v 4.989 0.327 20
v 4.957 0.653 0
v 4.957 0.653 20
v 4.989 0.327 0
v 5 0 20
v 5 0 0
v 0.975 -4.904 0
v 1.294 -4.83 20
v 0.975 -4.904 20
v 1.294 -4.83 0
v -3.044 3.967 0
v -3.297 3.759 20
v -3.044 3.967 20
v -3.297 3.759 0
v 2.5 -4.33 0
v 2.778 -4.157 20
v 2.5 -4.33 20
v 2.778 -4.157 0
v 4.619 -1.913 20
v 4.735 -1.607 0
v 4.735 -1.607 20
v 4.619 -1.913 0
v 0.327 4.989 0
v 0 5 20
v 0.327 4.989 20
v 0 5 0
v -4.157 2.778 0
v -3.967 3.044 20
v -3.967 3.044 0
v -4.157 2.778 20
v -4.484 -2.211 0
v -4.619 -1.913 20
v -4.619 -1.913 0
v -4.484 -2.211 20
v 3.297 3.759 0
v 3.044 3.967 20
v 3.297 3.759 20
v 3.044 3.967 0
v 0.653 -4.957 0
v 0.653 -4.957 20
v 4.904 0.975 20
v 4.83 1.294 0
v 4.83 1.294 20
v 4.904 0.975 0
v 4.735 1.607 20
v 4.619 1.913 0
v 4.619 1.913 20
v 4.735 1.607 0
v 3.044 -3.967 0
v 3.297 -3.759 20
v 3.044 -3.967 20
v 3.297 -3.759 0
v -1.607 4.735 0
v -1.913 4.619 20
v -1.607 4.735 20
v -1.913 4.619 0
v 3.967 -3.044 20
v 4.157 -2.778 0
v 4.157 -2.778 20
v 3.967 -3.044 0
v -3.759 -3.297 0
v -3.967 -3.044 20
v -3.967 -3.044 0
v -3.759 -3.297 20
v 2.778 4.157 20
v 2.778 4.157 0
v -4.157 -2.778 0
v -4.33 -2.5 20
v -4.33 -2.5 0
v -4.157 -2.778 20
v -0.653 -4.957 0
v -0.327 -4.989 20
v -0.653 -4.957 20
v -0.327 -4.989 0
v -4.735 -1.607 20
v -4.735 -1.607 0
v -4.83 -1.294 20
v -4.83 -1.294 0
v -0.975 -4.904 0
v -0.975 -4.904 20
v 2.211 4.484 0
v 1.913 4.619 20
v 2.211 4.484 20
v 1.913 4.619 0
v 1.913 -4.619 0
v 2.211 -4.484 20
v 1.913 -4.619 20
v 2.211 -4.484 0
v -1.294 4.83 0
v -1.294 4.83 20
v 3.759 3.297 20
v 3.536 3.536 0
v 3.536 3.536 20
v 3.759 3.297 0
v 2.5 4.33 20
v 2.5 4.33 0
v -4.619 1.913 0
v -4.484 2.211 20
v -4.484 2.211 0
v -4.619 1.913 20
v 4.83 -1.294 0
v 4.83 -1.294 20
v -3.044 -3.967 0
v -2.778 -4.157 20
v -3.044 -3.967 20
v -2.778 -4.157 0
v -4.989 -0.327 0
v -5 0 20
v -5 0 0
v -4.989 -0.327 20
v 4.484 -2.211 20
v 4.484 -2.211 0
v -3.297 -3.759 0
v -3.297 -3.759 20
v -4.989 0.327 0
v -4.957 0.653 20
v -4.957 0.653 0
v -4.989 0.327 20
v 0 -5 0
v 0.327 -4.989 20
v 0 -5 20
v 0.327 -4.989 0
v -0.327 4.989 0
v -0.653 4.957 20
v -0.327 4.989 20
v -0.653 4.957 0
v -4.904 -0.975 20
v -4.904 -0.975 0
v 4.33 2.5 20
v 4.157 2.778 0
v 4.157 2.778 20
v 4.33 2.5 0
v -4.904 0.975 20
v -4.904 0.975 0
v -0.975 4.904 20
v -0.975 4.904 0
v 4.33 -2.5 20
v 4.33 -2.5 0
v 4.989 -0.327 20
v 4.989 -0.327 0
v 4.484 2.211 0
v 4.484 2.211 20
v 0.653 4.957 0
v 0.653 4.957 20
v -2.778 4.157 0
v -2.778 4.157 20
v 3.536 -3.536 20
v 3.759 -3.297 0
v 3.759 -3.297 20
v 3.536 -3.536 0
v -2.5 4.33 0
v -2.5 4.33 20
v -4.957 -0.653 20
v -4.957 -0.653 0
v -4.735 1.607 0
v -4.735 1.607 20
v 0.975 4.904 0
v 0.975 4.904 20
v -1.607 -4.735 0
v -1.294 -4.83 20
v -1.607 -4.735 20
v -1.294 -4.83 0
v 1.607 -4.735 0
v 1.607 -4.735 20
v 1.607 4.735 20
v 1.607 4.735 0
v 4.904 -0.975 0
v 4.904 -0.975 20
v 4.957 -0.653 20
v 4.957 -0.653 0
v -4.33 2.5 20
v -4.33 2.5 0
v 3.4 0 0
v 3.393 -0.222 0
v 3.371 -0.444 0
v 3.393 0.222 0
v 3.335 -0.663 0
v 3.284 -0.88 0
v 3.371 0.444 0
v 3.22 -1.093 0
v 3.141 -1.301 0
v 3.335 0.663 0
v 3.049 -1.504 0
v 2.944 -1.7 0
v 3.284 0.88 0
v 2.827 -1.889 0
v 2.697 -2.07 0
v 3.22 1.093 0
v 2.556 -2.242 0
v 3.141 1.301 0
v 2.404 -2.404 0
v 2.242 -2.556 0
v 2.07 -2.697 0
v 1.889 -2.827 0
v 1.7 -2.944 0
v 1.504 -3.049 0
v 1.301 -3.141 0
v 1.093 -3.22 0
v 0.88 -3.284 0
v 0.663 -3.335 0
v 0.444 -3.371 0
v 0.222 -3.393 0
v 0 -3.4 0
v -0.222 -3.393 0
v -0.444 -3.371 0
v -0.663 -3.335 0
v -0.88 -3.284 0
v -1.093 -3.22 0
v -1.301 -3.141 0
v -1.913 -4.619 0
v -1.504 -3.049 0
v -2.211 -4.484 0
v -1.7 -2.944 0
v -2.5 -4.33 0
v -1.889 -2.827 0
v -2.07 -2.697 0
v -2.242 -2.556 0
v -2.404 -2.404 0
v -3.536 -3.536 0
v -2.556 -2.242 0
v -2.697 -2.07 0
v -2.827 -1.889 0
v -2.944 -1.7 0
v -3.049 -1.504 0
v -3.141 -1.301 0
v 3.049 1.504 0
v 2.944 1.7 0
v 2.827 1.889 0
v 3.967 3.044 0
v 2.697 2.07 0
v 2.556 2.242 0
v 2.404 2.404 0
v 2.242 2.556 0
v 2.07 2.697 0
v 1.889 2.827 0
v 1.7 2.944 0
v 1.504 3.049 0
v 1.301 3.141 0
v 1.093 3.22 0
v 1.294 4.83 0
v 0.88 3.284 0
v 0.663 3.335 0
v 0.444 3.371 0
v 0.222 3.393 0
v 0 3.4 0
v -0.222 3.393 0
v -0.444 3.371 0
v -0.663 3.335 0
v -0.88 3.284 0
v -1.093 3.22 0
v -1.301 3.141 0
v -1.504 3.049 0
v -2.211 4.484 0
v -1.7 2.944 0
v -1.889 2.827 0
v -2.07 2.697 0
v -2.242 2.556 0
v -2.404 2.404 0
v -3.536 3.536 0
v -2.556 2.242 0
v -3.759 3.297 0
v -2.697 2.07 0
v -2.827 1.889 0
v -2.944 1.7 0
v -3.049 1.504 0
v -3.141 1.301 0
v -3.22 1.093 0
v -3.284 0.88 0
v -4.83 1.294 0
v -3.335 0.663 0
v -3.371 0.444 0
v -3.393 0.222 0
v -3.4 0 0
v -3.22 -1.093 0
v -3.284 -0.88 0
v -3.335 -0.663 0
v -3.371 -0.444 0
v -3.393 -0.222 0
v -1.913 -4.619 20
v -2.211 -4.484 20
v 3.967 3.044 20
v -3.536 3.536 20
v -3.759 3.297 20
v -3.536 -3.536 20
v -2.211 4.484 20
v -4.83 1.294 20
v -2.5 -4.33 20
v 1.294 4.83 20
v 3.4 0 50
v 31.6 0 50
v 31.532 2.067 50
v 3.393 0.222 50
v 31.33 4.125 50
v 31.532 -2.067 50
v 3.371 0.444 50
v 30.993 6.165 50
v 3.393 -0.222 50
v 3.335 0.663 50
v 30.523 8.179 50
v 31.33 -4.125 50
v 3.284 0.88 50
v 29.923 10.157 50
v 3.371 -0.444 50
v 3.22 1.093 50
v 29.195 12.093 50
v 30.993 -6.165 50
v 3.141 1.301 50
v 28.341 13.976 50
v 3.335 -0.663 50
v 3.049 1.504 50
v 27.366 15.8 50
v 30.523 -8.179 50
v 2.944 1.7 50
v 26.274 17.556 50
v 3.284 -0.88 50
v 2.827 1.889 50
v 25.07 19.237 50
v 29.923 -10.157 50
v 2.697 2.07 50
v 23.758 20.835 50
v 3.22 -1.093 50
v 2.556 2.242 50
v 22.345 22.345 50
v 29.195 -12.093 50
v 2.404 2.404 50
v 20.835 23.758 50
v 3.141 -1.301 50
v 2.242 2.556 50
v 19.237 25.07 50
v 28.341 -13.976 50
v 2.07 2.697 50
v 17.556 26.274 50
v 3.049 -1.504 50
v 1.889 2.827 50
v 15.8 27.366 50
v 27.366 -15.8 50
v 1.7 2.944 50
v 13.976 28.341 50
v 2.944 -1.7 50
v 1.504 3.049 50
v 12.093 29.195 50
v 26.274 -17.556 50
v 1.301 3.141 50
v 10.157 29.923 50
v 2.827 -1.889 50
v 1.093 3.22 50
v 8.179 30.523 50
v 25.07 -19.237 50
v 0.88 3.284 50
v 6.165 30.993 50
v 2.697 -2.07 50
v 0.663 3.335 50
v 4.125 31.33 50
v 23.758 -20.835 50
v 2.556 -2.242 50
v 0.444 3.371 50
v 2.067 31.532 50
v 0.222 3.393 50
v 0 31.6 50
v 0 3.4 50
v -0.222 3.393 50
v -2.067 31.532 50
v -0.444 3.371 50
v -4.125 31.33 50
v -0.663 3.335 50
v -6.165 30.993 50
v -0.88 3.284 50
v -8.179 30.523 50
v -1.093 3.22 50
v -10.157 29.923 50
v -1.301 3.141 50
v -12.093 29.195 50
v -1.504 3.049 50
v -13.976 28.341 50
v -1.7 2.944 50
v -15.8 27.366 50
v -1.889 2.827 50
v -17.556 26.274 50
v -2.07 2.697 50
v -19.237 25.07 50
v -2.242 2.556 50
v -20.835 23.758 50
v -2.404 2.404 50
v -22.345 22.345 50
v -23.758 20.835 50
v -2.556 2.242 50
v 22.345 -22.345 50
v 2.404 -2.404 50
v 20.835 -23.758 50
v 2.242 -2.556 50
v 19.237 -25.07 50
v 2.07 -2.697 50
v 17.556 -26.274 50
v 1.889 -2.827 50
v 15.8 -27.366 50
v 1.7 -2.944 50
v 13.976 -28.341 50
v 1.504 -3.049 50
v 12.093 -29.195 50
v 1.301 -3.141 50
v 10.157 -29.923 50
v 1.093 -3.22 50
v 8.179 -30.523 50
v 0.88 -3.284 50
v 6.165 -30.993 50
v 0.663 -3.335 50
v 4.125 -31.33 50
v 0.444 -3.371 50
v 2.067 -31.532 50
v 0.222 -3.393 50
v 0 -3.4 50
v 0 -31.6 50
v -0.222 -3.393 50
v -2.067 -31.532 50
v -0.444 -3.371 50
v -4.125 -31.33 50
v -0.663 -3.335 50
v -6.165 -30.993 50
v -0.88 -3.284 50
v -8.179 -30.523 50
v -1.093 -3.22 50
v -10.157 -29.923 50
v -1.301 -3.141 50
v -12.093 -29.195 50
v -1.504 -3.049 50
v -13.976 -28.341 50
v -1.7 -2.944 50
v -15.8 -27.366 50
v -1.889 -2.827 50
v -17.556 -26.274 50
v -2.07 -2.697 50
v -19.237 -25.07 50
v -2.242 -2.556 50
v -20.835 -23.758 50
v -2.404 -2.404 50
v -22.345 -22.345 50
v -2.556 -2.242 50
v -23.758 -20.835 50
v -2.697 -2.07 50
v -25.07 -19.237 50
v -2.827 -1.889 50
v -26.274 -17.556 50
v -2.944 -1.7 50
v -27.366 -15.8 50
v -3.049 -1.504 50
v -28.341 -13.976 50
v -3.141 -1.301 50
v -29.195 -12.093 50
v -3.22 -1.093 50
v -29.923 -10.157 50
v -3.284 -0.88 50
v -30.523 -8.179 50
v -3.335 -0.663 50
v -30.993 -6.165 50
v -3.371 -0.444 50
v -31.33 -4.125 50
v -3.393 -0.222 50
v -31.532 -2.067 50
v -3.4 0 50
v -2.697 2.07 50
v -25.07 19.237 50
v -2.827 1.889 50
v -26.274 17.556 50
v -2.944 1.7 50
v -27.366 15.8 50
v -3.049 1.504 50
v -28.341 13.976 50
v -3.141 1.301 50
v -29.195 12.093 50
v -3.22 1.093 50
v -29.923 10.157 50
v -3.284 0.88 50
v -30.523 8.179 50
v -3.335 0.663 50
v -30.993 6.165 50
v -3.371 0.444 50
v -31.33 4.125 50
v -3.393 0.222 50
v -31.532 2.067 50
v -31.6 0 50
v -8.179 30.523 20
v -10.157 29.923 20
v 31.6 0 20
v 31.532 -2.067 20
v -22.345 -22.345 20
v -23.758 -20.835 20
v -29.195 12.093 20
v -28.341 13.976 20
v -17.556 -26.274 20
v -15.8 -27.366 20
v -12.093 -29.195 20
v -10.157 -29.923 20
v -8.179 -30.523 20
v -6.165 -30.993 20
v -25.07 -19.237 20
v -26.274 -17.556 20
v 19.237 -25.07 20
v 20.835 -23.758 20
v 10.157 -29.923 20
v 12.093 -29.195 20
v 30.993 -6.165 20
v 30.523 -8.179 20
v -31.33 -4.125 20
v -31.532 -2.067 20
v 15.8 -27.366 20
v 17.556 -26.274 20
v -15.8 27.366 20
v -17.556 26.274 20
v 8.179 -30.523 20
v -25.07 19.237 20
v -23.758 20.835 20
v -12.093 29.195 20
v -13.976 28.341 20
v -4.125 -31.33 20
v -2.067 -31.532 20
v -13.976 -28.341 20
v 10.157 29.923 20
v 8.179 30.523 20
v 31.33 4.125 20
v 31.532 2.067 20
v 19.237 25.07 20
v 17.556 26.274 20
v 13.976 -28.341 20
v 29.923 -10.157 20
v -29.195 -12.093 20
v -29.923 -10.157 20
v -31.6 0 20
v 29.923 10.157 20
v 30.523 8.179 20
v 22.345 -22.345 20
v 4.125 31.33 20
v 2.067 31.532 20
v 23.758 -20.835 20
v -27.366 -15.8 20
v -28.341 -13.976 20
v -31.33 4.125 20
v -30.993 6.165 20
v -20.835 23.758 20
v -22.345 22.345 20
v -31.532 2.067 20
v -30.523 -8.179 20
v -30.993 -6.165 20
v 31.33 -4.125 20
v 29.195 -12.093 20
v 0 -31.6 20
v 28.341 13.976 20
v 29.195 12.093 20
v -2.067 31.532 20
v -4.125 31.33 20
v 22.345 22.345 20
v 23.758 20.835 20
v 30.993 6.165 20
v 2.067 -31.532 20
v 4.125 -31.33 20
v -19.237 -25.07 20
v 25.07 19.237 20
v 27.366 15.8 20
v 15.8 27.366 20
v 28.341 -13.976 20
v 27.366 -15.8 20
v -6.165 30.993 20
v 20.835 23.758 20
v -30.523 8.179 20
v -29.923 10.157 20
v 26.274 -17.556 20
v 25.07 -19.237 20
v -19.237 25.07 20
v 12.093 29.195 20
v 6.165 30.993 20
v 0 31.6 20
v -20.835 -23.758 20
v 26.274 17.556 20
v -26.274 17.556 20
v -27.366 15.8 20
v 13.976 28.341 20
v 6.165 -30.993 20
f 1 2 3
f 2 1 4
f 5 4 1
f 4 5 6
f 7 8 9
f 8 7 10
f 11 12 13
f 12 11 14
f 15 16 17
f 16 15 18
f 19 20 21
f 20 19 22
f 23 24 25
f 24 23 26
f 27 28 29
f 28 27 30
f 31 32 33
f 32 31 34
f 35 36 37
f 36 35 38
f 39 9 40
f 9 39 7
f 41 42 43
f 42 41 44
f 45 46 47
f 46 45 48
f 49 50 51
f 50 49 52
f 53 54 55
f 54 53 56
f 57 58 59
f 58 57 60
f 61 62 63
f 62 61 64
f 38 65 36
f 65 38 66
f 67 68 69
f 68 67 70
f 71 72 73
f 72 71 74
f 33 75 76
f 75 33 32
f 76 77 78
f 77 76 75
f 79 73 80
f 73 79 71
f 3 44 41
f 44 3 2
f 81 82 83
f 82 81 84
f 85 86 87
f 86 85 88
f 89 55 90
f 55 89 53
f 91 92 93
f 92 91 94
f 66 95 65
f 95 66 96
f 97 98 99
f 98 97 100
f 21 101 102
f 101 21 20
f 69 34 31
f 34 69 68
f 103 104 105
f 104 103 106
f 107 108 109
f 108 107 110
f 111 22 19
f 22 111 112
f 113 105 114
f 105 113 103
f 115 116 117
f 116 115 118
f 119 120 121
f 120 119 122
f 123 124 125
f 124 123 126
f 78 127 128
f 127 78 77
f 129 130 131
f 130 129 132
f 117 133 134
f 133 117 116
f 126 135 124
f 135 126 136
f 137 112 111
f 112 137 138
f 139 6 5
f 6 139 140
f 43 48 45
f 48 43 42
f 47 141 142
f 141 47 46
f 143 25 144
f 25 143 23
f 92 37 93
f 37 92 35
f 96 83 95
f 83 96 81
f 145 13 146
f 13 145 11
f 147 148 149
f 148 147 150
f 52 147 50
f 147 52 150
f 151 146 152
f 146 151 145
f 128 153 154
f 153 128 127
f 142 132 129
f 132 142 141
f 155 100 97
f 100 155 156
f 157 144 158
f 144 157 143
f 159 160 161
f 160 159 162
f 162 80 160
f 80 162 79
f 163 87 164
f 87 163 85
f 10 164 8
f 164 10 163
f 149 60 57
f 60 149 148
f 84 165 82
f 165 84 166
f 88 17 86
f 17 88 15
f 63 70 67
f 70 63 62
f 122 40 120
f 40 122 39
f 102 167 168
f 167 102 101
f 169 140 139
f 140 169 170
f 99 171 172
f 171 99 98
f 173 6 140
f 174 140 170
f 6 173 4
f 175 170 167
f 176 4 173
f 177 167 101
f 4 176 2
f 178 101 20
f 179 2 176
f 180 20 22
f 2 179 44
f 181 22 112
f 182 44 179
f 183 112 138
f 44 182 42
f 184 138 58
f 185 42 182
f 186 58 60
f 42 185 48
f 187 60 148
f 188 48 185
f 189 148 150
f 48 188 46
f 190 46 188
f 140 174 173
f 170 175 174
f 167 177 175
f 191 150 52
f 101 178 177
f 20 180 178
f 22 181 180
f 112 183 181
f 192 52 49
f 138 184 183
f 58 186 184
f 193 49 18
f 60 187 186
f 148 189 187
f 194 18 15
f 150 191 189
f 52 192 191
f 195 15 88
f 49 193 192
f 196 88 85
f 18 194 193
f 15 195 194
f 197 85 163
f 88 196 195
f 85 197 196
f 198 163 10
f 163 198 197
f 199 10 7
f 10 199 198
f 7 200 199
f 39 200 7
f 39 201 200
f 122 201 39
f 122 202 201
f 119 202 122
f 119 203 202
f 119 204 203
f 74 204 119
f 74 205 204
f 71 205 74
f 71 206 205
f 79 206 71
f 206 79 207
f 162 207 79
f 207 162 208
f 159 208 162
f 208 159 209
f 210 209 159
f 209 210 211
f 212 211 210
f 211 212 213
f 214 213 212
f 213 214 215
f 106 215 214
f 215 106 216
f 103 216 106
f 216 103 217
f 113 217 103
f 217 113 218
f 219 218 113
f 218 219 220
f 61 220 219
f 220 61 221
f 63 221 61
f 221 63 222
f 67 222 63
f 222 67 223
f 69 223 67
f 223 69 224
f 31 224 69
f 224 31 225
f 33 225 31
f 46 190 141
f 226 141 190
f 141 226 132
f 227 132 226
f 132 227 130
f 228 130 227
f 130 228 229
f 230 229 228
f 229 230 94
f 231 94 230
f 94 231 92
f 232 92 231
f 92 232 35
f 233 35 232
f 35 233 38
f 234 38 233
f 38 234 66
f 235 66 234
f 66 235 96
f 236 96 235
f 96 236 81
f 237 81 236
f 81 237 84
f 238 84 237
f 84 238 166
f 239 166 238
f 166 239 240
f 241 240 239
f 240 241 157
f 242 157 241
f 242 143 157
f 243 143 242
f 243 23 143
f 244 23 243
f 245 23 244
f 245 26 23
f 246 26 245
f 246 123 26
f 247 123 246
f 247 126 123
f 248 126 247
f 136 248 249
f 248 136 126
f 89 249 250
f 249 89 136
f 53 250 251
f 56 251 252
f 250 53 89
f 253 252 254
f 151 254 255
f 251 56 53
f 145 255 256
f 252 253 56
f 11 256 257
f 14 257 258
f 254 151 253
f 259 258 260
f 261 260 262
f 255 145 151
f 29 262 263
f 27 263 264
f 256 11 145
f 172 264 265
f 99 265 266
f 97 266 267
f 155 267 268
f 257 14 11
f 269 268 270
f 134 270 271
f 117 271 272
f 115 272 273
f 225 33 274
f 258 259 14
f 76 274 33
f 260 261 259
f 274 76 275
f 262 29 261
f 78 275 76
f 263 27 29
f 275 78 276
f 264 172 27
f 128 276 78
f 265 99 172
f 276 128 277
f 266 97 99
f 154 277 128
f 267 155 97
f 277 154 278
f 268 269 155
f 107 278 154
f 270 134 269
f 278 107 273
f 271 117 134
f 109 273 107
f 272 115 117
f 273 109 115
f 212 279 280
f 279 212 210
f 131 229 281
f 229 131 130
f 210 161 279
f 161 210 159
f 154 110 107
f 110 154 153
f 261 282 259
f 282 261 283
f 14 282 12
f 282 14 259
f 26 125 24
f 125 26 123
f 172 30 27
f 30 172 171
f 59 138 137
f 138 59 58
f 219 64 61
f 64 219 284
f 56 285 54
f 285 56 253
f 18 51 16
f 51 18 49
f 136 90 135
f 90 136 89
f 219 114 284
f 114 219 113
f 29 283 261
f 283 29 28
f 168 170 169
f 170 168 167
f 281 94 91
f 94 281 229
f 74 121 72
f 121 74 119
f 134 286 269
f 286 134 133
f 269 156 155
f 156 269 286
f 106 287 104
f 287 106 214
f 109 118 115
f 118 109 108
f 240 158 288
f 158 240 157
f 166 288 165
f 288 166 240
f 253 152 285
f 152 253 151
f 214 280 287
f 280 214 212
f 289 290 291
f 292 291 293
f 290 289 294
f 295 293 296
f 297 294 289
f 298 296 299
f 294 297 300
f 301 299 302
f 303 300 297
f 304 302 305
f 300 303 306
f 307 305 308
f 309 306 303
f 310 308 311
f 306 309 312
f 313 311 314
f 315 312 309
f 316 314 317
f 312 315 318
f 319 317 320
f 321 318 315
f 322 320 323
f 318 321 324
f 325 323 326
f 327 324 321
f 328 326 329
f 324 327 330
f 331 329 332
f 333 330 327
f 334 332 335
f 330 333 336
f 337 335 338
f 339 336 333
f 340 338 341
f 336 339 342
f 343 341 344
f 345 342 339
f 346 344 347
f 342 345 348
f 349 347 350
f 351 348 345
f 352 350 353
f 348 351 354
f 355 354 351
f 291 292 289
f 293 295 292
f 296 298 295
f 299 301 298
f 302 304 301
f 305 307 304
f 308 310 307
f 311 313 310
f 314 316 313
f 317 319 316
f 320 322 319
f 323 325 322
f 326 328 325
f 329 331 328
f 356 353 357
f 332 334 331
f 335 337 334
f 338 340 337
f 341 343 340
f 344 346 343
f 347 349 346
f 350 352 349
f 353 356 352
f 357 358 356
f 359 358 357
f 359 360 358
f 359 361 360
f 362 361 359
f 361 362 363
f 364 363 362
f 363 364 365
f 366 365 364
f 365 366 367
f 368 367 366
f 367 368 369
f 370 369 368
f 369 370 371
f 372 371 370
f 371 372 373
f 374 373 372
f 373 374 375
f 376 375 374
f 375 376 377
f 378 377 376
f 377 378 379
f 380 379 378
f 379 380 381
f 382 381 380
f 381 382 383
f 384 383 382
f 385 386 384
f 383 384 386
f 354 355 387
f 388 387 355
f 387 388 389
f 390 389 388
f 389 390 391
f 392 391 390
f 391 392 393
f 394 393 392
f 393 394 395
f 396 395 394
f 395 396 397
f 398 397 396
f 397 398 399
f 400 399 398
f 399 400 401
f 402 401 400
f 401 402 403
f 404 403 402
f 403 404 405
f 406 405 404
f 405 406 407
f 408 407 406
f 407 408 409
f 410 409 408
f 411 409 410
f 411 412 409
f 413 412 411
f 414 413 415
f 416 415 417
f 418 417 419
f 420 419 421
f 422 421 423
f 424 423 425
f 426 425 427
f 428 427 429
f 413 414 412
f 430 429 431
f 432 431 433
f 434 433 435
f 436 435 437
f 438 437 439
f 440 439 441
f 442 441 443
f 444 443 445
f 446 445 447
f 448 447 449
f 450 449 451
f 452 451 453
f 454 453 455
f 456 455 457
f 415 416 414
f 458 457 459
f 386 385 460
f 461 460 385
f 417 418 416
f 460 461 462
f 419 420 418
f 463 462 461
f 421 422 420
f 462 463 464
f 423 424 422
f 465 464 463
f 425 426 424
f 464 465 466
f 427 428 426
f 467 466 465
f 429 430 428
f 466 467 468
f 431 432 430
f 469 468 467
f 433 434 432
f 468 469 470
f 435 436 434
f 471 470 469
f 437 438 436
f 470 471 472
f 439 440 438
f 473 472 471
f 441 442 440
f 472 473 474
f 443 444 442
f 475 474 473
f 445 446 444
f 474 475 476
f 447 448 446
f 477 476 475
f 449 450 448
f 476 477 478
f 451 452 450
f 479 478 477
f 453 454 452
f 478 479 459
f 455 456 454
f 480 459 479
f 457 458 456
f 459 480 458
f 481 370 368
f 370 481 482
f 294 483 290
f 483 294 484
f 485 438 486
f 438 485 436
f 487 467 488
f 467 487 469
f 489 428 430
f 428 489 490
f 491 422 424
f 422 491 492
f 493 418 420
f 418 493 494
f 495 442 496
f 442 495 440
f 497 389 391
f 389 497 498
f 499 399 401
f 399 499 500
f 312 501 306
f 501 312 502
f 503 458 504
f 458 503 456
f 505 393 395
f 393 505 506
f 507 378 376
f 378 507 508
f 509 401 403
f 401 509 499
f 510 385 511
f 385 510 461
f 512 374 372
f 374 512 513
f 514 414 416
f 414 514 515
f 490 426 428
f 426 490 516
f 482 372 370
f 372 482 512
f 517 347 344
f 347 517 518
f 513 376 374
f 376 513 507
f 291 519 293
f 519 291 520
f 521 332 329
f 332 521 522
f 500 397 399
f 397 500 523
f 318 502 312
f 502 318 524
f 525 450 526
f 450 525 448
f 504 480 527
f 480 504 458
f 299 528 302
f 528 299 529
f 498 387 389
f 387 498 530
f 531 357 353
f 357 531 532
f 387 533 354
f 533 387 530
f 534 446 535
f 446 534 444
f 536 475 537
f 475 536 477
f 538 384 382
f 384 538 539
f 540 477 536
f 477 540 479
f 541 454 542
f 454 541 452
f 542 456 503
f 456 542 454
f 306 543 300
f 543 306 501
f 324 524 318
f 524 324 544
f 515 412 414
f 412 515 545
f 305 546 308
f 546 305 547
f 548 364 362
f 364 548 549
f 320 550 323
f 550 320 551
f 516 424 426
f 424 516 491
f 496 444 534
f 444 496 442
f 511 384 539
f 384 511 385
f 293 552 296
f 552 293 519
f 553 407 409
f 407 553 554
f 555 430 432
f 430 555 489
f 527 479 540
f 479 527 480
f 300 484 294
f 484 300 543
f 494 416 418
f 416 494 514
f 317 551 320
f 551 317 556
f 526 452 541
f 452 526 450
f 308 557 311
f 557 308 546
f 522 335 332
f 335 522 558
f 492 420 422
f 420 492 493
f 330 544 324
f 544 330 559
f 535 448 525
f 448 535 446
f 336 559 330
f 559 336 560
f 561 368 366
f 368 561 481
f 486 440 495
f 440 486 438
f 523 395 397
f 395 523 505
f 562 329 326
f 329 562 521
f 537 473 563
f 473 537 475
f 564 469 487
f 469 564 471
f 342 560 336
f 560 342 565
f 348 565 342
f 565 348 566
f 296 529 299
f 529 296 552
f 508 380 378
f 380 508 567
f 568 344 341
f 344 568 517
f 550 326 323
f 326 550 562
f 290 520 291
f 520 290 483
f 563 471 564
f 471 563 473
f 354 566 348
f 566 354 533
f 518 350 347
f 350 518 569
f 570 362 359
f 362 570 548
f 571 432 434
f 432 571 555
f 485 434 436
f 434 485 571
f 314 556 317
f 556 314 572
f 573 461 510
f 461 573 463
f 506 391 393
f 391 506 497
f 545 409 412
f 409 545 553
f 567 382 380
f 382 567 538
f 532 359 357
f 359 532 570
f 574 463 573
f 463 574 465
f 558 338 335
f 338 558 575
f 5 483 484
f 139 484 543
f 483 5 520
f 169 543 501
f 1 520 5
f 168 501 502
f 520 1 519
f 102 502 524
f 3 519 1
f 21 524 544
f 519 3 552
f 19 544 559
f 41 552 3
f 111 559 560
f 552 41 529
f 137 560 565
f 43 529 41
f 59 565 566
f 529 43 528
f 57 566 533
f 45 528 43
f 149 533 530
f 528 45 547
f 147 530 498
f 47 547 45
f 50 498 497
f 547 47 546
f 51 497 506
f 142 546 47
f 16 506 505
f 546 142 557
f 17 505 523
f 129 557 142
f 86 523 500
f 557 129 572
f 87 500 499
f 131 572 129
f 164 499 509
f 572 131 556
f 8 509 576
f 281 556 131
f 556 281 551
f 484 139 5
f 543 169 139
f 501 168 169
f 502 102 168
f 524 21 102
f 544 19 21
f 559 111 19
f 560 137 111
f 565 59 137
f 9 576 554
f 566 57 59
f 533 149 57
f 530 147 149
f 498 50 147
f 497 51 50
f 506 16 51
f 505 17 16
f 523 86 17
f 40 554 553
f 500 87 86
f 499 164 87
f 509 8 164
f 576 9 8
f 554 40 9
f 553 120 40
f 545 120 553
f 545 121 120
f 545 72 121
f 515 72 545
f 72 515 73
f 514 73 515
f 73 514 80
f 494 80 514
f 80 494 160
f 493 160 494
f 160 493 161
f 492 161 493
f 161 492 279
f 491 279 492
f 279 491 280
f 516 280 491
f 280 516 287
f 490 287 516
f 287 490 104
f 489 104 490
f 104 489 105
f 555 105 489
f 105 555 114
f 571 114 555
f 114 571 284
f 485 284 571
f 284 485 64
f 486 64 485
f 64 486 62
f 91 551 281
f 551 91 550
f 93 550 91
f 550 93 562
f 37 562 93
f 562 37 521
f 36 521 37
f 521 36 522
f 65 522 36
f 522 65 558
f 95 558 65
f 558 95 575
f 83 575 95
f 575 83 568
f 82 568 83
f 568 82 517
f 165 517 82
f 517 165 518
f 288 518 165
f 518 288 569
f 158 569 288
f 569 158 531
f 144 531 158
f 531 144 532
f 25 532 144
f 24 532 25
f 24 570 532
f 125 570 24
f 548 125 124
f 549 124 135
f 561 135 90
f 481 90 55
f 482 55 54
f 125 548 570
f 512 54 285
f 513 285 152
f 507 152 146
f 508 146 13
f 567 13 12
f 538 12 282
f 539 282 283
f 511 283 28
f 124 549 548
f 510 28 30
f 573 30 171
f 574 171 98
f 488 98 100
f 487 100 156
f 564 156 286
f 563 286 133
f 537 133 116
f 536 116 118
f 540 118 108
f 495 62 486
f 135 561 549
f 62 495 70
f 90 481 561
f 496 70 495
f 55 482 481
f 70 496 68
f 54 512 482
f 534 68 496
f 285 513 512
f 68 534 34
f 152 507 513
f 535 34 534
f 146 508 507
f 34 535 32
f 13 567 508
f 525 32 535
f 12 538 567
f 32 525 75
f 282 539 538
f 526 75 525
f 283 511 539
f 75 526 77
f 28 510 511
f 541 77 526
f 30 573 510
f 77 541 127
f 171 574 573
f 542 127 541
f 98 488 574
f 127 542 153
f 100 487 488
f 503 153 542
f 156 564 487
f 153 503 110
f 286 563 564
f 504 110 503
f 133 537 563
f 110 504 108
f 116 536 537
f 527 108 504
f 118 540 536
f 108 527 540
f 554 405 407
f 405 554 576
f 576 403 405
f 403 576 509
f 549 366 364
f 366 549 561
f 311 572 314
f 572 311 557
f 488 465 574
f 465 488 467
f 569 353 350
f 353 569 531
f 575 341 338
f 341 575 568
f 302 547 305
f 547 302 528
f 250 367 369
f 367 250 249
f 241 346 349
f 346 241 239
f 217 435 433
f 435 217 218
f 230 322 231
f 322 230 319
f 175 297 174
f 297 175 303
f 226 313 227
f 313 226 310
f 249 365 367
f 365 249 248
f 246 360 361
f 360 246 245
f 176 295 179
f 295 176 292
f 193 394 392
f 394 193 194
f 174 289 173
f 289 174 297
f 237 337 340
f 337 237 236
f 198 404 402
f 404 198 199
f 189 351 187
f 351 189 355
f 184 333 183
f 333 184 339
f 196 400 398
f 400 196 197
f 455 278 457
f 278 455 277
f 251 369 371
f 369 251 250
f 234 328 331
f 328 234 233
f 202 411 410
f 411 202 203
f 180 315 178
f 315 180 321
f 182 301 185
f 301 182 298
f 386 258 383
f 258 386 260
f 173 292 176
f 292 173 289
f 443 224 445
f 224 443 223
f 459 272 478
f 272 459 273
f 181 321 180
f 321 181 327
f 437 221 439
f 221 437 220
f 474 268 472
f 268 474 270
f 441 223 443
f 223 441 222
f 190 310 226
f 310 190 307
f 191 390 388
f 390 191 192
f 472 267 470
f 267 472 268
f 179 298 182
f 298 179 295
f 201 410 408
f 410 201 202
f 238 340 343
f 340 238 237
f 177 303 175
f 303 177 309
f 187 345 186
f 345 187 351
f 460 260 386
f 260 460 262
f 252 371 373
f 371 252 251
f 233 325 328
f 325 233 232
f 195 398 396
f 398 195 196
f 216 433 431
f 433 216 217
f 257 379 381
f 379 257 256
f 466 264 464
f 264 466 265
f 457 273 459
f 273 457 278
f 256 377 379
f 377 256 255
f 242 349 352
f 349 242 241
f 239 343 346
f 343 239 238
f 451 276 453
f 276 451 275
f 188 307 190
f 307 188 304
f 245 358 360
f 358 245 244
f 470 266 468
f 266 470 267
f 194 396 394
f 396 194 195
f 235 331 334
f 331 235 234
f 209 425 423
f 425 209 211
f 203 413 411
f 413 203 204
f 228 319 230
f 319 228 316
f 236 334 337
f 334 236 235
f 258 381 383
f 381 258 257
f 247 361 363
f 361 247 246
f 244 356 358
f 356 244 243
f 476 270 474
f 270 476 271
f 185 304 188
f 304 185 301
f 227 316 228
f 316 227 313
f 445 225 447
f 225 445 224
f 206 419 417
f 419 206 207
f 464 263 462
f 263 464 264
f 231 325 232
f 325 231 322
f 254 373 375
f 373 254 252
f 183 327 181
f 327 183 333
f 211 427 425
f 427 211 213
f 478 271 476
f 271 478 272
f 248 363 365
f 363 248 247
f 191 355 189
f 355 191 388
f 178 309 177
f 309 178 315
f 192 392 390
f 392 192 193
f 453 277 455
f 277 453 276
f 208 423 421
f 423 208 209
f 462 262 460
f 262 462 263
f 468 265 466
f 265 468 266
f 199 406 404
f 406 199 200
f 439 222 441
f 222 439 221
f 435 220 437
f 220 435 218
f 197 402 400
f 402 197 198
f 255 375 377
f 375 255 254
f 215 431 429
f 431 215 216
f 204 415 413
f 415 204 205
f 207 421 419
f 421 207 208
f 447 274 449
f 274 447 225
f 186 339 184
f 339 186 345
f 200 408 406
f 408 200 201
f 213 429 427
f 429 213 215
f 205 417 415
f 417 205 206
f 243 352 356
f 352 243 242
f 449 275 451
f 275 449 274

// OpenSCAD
// Funnel - printed upright, open top and bottom
// Units: mm

// ---- Spout ----
spout_od     = 10;    // spout outer diameter
spout_id     = spout_od - 2 * 1.6;  // spout bore (6.8)
spout_len    = 20;    // spout length (z = 0 to 20)

// ---- Cone ----
cone_d0      = 10;    // cone outer diameter at z = 20
cone_d1      = 60;    // cone outer diameter at rim (z = 50)
cone_h       = 30;    // cone height (z = 20 to 50)

// ---- Misc ----
eps          = 0.5;   // cutter overshoot past faces
wall         = 1.6;   // wall thickness

$fn = 96;

// Cone top diameter + 2*wall (open rim, no lip)
cone_d1_ext = cone_d1 + 2 * wall;

difference() {
    union() {
        // Spout
        cylinder(h = spout_len, d = spout_od);
        // Cone
        translate([0, 0, spout_len])
            linear_extrude(cone_h)
                circle(d = cone_d0);
        translate([0, 0, spout_len])
            linear_extrude(cone_h)
                circle(d = cone_d1_ext);
    }
    // Through-bore: spout bore extended into the cone
    translate([0, 0, -eps])
        cylinder(h = spout_len + cone_h + 2 * eps, d = spout_id);
}
